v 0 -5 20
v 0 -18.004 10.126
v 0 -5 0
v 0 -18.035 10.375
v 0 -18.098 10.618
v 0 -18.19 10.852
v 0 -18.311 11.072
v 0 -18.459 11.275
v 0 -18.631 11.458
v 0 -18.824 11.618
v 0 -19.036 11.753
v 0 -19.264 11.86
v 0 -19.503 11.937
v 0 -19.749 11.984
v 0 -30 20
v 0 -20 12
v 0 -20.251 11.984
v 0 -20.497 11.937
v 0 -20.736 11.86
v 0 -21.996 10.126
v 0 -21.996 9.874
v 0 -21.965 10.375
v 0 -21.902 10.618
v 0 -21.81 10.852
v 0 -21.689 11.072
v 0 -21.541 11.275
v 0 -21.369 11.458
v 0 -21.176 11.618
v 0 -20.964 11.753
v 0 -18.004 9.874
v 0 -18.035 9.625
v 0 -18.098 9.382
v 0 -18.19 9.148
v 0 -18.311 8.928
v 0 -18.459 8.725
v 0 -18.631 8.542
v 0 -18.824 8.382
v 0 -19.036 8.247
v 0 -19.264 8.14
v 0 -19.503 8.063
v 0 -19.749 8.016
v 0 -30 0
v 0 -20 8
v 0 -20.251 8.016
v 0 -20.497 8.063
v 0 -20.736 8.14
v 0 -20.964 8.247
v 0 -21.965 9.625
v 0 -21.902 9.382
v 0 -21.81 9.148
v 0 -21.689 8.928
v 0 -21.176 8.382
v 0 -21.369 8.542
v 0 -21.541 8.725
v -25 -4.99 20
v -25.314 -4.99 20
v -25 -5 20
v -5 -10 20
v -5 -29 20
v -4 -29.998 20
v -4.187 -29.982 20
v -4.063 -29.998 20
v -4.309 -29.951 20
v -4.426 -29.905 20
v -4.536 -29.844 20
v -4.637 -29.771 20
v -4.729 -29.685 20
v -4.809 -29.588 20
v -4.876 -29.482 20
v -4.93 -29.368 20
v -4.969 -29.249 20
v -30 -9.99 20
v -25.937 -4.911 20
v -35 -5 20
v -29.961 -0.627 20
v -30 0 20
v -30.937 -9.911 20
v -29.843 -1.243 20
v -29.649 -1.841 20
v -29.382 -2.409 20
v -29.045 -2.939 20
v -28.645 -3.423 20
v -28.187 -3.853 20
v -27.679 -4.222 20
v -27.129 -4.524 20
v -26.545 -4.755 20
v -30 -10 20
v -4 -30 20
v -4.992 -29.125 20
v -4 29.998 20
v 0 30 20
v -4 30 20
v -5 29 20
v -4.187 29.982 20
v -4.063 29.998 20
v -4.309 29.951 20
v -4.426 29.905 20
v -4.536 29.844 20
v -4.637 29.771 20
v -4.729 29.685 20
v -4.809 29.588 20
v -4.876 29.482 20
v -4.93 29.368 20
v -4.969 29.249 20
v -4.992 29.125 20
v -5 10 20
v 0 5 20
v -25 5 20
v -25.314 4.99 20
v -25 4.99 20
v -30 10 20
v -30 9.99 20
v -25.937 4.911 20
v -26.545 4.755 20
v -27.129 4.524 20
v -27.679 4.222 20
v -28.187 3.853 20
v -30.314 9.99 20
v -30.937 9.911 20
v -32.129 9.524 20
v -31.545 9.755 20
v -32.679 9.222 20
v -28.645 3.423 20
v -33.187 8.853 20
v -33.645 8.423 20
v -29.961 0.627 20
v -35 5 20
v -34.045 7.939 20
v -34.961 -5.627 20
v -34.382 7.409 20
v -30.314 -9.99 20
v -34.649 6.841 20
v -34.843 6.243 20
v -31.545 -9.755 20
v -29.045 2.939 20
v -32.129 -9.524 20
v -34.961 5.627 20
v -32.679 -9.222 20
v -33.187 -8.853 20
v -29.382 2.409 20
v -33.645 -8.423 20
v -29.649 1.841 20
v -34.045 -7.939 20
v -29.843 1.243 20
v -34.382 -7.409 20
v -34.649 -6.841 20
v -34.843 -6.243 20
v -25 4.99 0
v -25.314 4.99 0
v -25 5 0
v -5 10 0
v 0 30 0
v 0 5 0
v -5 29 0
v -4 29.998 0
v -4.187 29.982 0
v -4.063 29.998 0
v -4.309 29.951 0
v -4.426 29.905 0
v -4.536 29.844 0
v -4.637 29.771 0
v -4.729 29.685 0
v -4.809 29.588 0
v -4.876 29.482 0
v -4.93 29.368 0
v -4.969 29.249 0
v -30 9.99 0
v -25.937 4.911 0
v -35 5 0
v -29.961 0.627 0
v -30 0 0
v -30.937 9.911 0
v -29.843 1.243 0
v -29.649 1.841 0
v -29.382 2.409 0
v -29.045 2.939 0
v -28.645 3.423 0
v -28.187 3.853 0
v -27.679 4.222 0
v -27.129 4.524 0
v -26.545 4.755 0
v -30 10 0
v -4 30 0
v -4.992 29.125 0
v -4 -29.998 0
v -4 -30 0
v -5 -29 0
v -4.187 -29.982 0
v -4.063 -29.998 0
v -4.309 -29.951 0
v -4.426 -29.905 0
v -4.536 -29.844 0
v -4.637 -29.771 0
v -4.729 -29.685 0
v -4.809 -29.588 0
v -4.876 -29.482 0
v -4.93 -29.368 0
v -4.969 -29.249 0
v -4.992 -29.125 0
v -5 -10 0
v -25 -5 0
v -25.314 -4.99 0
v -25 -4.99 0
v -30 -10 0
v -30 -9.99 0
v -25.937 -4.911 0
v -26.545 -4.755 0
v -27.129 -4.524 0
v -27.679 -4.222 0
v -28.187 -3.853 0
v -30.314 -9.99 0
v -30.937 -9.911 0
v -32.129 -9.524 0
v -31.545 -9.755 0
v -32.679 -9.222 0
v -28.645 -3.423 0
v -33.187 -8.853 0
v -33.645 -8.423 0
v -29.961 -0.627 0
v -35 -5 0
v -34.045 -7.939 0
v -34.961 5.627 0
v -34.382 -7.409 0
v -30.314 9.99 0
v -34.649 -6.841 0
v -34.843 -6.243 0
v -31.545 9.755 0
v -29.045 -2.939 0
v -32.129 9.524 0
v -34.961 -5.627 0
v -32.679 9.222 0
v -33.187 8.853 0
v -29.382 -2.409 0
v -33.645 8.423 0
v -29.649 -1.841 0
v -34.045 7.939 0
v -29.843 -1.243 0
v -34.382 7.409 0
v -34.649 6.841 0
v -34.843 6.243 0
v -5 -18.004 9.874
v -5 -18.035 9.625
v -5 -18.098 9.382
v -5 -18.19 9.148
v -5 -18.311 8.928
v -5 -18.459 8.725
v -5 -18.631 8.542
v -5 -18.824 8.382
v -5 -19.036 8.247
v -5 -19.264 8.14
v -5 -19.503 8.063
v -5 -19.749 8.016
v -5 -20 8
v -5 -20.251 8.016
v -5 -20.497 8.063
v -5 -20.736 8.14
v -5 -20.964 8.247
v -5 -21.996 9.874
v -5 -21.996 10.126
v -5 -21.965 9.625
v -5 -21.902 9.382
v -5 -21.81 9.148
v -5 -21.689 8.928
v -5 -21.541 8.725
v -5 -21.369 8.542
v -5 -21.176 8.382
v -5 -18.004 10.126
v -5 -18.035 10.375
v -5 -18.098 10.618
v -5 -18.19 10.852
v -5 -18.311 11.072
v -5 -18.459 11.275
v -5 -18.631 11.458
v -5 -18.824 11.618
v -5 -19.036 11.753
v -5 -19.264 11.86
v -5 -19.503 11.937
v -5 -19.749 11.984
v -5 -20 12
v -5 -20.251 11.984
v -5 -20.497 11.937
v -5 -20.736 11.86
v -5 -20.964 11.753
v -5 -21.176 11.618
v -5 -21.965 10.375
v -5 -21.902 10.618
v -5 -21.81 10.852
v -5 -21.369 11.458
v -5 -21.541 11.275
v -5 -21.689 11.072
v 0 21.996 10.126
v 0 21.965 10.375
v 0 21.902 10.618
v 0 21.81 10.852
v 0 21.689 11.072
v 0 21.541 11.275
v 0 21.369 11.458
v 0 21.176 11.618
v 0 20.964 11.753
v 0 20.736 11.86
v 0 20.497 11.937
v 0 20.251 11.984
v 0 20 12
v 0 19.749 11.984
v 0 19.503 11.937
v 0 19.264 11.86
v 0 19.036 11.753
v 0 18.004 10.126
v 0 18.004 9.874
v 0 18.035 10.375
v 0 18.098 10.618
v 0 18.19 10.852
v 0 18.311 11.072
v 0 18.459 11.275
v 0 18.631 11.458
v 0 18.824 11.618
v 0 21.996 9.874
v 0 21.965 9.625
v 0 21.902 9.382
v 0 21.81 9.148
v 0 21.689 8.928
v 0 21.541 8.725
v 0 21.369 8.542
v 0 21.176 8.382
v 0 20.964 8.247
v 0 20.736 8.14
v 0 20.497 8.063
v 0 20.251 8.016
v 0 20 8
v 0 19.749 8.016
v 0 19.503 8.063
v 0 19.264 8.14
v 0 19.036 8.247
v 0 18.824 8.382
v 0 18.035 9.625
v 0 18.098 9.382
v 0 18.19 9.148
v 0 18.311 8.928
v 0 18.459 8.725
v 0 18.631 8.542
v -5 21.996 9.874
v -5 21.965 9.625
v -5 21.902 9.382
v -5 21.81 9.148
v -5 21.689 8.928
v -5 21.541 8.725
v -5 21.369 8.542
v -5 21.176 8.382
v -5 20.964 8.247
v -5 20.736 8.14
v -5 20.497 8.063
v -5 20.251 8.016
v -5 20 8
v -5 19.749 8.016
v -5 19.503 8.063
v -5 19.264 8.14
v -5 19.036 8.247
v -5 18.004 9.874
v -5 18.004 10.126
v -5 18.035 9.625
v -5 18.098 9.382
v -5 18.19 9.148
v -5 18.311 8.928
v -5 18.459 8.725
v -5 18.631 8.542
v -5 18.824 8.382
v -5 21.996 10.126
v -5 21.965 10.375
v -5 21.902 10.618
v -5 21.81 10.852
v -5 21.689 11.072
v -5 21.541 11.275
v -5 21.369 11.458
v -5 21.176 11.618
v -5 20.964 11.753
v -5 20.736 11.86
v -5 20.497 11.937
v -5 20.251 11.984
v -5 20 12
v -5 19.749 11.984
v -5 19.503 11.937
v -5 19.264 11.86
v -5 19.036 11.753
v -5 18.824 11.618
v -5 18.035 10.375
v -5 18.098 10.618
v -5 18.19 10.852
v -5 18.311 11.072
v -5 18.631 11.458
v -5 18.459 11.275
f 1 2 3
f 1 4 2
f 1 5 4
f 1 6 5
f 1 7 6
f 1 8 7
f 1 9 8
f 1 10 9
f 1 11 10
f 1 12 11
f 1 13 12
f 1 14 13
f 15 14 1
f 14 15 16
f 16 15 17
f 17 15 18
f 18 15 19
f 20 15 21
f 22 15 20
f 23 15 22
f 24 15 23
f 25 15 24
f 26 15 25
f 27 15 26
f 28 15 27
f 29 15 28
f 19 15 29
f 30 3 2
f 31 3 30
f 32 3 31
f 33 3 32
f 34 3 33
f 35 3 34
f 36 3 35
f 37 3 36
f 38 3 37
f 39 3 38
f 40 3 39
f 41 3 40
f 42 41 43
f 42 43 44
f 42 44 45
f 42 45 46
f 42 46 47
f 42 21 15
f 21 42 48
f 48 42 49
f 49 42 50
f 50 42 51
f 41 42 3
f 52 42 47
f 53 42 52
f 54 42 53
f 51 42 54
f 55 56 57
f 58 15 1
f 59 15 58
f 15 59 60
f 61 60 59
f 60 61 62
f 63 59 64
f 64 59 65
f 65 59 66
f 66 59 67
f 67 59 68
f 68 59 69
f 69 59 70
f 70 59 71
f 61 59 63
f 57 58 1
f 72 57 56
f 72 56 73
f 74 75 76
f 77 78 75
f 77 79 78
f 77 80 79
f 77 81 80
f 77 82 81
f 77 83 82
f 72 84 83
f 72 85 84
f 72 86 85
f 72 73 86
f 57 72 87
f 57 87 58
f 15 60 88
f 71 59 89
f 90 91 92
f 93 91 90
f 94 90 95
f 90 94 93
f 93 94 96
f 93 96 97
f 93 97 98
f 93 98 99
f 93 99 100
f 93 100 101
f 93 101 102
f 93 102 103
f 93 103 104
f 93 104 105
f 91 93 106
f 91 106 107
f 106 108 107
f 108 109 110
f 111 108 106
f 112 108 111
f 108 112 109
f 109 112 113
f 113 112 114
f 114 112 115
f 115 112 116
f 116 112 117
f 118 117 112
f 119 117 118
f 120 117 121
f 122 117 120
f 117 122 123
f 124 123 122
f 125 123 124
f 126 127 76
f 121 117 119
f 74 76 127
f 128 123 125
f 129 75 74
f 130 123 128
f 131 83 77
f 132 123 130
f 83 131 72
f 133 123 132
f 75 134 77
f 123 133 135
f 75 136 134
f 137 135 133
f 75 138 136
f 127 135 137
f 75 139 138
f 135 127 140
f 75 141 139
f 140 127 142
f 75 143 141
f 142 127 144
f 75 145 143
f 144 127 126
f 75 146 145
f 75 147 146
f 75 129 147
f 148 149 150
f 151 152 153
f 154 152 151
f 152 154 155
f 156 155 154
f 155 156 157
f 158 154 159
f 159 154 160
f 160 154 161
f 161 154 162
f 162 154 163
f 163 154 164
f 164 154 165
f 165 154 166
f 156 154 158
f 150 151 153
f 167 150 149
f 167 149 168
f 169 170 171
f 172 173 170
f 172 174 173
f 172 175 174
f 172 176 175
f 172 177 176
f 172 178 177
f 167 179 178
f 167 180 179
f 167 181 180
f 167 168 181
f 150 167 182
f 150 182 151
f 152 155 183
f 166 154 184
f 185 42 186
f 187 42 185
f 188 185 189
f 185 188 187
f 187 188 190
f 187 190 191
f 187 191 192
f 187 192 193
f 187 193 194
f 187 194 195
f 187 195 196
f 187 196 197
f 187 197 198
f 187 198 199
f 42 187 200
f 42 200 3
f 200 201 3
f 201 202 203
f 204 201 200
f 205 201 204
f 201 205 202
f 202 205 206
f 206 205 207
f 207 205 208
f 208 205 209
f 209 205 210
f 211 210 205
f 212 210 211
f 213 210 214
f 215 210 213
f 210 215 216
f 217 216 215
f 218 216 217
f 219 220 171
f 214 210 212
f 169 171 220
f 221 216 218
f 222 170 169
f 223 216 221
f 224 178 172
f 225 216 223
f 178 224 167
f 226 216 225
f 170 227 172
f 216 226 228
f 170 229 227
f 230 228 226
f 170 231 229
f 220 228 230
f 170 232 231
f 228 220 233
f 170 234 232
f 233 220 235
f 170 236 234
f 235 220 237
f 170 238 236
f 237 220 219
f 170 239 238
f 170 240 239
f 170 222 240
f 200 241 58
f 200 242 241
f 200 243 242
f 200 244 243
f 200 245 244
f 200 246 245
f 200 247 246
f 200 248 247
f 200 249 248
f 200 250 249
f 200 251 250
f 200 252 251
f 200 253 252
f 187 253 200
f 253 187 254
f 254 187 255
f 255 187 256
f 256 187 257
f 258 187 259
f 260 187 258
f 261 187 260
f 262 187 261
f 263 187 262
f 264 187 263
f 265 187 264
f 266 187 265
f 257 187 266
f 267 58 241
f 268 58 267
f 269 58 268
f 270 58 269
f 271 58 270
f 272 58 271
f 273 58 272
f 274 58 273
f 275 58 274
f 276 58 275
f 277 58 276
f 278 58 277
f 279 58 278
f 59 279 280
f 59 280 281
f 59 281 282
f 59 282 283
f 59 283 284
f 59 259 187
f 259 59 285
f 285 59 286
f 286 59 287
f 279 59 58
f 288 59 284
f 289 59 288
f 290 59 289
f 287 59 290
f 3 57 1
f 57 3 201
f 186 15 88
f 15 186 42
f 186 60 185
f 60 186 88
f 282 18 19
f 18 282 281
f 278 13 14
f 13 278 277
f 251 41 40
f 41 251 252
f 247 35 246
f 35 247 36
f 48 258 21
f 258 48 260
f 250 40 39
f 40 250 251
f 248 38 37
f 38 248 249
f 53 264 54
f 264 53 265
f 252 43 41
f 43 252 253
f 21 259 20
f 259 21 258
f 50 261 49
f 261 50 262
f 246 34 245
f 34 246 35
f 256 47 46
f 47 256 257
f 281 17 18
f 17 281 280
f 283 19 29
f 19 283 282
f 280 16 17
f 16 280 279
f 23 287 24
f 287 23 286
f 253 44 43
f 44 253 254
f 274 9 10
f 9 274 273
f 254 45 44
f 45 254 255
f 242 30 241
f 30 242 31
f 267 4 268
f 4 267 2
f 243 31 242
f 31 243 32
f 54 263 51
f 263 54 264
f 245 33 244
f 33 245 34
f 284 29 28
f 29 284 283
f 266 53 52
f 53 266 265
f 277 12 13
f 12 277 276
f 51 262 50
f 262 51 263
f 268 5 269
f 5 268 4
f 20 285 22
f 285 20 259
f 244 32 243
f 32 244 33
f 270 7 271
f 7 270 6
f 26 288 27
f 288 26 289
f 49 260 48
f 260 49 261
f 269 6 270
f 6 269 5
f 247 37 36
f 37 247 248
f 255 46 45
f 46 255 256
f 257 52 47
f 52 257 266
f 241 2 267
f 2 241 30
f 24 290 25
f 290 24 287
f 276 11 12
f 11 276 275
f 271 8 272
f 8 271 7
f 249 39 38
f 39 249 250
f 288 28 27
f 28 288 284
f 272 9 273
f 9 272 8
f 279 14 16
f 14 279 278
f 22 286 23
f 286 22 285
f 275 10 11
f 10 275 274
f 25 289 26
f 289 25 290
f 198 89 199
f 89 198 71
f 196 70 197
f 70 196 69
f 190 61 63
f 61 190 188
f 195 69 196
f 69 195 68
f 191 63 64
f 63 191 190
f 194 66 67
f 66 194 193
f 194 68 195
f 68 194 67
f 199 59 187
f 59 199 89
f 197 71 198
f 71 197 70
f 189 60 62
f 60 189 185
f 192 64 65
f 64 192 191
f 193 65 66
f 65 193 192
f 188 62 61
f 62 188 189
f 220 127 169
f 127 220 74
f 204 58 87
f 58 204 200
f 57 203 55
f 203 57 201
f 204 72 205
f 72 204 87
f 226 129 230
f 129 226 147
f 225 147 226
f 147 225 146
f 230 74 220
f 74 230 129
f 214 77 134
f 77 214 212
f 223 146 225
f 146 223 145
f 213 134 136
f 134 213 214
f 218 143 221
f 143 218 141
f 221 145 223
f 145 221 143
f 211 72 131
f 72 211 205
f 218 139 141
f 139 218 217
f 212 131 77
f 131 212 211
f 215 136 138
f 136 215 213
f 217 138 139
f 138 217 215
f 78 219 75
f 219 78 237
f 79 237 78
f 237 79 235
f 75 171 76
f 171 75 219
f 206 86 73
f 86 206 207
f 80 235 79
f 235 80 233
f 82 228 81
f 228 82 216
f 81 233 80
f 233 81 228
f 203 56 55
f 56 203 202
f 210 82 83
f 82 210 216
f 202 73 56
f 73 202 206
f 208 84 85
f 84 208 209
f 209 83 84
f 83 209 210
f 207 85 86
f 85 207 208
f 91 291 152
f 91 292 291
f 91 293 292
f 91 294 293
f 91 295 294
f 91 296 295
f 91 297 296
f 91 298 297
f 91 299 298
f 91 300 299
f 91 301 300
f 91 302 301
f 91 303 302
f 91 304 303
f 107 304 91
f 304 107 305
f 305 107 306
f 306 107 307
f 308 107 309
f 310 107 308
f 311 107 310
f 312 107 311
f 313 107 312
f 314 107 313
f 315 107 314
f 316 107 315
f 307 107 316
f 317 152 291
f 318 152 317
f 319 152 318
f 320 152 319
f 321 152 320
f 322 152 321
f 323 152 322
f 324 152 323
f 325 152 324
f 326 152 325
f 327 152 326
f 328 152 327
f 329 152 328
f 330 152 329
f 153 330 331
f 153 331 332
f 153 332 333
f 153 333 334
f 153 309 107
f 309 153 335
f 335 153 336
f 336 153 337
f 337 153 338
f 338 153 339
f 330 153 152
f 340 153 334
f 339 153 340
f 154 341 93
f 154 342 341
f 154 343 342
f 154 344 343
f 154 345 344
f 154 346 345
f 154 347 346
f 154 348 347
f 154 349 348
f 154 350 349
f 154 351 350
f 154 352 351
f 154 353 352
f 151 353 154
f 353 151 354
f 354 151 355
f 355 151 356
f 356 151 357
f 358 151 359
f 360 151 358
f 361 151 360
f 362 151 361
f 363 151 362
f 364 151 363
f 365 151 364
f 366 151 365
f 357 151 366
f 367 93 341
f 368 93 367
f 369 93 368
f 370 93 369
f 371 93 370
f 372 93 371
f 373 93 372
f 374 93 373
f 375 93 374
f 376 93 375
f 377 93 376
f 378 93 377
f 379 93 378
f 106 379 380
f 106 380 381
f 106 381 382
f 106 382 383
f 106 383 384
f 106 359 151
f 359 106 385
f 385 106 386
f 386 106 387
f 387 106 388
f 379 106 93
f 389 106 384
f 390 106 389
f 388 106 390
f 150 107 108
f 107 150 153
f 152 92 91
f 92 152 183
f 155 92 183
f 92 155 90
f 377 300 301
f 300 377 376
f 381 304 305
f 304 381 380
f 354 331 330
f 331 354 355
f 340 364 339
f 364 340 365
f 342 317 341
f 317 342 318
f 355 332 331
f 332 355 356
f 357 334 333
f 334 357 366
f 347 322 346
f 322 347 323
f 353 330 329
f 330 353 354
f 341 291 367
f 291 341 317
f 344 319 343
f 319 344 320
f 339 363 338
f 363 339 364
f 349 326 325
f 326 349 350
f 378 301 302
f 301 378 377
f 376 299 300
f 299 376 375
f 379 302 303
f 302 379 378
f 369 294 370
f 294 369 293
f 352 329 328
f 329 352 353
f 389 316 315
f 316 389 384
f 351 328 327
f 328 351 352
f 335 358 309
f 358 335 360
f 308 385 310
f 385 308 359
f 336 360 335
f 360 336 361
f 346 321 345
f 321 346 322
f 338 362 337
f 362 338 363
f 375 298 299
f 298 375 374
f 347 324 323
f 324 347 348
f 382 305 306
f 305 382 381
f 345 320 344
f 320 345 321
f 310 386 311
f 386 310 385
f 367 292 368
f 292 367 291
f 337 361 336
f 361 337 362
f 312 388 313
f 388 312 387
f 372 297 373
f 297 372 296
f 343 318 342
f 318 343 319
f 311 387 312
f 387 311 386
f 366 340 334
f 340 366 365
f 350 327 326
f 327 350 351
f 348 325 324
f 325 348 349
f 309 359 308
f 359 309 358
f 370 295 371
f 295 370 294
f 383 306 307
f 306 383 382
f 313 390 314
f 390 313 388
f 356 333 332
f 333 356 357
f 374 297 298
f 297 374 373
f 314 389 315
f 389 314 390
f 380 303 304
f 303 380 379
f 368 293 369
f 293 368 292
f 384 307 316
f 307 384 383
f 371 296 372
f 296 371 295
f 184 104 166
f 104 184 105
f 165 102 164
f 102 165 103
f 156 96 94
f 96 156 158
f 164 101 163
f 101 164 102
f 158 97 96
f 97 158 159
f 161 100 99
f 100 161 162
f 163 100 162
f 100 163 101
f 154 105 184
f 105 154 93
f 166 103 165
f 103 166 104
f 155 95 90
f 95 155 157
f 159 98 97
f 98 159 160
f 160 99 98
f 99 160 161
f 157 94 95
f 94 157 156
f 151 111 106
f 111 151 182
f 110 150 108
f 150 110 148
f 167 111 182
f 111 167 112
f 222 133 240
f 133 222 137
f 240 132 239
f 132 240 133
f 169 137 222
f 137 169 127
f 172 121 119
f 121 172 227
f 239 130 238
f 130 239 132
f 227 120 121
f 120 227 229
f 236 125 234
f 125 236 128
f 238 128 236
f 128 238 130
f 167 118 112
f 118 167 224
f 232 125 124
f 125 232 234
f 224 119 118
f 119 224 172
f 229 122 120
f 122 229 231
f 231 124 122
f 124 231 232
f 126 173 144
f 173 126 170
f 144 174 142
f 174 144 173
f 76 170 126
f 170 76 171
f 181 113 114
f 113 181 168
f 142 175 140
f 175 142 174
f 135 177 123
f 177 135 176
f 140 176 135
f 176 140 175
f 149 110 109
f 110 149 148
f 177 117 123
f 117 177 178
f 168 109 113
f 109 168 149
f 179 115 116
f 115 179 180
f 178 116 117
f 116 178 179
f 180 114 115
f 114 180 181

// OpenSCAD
module Drilling(height, radius, position = [0, 0, 0]) {
    translate(position) cylinder(h = height, r = radius);
}

module MirrorCopy(vector = [0, 1, 0]) {
    mirror (vector) children();
}

$fn = 50;

module RoundedRidge(length, radius = 1) {
    cylinder(h = length, r = radius);
}


module Baseplate() {
    cubeSize            = [5, 25, 20];
    cubePosition        = [-5, -30, 0];
    roundSize           = [1, 1, 20];
    roundLength         = 20;
    roundPosition       = [-4, -29, 0];
    drillingPosition    = [-10, 10, 0];
    drillingRotation    = [0, 90, 0];
    drillingHeight      = 5.00001;
    drillingRadius      = 2;
    
    translate(roundPosition) RoundedRidge(roundLength);
    
    translate(cubePosition) difference() {
        cube(cubeSize);
        cube(roundSize);
        rotate(drillingRotation) Drilling(drillingHeight, drillingRadius, drillingPosition, drillingRotation);
    }
}


module Pillar() {
    basisSize           = [35, 5, 20];
    basisPosition       = [-35, -10, 0];
    domeSize            = [10, 10, 20];
    roundSize           = [5, 5, 20];
    
    translate(basisPosition) difference() {
        union() {
            cube(basisSize);
            cube(domeSize);
        }
        cube(roundSize);
    }
}


module Arc() {
    roundLength         = 20;
    roundRadius         = 5;
    roundPosition       = [-30, -5, 0];
    
    union() {
        Pillar();
        translate(roundPosition) RoundedRidge(roundLength, roundRadius);
    }
}


module HalfBridge() {
    
    drillingHeight      = 20;
    drillingRadius      = 5;
    drillingPosition    = [-25, 0, 0];
    
    difference() {
        Arc();
        Drilling(drillingHeight, drillingRadius, drillingPosition);
    }
}


module DeskMount() {
    union() {
        Baseplate();
        HalfBridge();
    }
}



DeskMount();
MirrorCopy() DeskMount();
